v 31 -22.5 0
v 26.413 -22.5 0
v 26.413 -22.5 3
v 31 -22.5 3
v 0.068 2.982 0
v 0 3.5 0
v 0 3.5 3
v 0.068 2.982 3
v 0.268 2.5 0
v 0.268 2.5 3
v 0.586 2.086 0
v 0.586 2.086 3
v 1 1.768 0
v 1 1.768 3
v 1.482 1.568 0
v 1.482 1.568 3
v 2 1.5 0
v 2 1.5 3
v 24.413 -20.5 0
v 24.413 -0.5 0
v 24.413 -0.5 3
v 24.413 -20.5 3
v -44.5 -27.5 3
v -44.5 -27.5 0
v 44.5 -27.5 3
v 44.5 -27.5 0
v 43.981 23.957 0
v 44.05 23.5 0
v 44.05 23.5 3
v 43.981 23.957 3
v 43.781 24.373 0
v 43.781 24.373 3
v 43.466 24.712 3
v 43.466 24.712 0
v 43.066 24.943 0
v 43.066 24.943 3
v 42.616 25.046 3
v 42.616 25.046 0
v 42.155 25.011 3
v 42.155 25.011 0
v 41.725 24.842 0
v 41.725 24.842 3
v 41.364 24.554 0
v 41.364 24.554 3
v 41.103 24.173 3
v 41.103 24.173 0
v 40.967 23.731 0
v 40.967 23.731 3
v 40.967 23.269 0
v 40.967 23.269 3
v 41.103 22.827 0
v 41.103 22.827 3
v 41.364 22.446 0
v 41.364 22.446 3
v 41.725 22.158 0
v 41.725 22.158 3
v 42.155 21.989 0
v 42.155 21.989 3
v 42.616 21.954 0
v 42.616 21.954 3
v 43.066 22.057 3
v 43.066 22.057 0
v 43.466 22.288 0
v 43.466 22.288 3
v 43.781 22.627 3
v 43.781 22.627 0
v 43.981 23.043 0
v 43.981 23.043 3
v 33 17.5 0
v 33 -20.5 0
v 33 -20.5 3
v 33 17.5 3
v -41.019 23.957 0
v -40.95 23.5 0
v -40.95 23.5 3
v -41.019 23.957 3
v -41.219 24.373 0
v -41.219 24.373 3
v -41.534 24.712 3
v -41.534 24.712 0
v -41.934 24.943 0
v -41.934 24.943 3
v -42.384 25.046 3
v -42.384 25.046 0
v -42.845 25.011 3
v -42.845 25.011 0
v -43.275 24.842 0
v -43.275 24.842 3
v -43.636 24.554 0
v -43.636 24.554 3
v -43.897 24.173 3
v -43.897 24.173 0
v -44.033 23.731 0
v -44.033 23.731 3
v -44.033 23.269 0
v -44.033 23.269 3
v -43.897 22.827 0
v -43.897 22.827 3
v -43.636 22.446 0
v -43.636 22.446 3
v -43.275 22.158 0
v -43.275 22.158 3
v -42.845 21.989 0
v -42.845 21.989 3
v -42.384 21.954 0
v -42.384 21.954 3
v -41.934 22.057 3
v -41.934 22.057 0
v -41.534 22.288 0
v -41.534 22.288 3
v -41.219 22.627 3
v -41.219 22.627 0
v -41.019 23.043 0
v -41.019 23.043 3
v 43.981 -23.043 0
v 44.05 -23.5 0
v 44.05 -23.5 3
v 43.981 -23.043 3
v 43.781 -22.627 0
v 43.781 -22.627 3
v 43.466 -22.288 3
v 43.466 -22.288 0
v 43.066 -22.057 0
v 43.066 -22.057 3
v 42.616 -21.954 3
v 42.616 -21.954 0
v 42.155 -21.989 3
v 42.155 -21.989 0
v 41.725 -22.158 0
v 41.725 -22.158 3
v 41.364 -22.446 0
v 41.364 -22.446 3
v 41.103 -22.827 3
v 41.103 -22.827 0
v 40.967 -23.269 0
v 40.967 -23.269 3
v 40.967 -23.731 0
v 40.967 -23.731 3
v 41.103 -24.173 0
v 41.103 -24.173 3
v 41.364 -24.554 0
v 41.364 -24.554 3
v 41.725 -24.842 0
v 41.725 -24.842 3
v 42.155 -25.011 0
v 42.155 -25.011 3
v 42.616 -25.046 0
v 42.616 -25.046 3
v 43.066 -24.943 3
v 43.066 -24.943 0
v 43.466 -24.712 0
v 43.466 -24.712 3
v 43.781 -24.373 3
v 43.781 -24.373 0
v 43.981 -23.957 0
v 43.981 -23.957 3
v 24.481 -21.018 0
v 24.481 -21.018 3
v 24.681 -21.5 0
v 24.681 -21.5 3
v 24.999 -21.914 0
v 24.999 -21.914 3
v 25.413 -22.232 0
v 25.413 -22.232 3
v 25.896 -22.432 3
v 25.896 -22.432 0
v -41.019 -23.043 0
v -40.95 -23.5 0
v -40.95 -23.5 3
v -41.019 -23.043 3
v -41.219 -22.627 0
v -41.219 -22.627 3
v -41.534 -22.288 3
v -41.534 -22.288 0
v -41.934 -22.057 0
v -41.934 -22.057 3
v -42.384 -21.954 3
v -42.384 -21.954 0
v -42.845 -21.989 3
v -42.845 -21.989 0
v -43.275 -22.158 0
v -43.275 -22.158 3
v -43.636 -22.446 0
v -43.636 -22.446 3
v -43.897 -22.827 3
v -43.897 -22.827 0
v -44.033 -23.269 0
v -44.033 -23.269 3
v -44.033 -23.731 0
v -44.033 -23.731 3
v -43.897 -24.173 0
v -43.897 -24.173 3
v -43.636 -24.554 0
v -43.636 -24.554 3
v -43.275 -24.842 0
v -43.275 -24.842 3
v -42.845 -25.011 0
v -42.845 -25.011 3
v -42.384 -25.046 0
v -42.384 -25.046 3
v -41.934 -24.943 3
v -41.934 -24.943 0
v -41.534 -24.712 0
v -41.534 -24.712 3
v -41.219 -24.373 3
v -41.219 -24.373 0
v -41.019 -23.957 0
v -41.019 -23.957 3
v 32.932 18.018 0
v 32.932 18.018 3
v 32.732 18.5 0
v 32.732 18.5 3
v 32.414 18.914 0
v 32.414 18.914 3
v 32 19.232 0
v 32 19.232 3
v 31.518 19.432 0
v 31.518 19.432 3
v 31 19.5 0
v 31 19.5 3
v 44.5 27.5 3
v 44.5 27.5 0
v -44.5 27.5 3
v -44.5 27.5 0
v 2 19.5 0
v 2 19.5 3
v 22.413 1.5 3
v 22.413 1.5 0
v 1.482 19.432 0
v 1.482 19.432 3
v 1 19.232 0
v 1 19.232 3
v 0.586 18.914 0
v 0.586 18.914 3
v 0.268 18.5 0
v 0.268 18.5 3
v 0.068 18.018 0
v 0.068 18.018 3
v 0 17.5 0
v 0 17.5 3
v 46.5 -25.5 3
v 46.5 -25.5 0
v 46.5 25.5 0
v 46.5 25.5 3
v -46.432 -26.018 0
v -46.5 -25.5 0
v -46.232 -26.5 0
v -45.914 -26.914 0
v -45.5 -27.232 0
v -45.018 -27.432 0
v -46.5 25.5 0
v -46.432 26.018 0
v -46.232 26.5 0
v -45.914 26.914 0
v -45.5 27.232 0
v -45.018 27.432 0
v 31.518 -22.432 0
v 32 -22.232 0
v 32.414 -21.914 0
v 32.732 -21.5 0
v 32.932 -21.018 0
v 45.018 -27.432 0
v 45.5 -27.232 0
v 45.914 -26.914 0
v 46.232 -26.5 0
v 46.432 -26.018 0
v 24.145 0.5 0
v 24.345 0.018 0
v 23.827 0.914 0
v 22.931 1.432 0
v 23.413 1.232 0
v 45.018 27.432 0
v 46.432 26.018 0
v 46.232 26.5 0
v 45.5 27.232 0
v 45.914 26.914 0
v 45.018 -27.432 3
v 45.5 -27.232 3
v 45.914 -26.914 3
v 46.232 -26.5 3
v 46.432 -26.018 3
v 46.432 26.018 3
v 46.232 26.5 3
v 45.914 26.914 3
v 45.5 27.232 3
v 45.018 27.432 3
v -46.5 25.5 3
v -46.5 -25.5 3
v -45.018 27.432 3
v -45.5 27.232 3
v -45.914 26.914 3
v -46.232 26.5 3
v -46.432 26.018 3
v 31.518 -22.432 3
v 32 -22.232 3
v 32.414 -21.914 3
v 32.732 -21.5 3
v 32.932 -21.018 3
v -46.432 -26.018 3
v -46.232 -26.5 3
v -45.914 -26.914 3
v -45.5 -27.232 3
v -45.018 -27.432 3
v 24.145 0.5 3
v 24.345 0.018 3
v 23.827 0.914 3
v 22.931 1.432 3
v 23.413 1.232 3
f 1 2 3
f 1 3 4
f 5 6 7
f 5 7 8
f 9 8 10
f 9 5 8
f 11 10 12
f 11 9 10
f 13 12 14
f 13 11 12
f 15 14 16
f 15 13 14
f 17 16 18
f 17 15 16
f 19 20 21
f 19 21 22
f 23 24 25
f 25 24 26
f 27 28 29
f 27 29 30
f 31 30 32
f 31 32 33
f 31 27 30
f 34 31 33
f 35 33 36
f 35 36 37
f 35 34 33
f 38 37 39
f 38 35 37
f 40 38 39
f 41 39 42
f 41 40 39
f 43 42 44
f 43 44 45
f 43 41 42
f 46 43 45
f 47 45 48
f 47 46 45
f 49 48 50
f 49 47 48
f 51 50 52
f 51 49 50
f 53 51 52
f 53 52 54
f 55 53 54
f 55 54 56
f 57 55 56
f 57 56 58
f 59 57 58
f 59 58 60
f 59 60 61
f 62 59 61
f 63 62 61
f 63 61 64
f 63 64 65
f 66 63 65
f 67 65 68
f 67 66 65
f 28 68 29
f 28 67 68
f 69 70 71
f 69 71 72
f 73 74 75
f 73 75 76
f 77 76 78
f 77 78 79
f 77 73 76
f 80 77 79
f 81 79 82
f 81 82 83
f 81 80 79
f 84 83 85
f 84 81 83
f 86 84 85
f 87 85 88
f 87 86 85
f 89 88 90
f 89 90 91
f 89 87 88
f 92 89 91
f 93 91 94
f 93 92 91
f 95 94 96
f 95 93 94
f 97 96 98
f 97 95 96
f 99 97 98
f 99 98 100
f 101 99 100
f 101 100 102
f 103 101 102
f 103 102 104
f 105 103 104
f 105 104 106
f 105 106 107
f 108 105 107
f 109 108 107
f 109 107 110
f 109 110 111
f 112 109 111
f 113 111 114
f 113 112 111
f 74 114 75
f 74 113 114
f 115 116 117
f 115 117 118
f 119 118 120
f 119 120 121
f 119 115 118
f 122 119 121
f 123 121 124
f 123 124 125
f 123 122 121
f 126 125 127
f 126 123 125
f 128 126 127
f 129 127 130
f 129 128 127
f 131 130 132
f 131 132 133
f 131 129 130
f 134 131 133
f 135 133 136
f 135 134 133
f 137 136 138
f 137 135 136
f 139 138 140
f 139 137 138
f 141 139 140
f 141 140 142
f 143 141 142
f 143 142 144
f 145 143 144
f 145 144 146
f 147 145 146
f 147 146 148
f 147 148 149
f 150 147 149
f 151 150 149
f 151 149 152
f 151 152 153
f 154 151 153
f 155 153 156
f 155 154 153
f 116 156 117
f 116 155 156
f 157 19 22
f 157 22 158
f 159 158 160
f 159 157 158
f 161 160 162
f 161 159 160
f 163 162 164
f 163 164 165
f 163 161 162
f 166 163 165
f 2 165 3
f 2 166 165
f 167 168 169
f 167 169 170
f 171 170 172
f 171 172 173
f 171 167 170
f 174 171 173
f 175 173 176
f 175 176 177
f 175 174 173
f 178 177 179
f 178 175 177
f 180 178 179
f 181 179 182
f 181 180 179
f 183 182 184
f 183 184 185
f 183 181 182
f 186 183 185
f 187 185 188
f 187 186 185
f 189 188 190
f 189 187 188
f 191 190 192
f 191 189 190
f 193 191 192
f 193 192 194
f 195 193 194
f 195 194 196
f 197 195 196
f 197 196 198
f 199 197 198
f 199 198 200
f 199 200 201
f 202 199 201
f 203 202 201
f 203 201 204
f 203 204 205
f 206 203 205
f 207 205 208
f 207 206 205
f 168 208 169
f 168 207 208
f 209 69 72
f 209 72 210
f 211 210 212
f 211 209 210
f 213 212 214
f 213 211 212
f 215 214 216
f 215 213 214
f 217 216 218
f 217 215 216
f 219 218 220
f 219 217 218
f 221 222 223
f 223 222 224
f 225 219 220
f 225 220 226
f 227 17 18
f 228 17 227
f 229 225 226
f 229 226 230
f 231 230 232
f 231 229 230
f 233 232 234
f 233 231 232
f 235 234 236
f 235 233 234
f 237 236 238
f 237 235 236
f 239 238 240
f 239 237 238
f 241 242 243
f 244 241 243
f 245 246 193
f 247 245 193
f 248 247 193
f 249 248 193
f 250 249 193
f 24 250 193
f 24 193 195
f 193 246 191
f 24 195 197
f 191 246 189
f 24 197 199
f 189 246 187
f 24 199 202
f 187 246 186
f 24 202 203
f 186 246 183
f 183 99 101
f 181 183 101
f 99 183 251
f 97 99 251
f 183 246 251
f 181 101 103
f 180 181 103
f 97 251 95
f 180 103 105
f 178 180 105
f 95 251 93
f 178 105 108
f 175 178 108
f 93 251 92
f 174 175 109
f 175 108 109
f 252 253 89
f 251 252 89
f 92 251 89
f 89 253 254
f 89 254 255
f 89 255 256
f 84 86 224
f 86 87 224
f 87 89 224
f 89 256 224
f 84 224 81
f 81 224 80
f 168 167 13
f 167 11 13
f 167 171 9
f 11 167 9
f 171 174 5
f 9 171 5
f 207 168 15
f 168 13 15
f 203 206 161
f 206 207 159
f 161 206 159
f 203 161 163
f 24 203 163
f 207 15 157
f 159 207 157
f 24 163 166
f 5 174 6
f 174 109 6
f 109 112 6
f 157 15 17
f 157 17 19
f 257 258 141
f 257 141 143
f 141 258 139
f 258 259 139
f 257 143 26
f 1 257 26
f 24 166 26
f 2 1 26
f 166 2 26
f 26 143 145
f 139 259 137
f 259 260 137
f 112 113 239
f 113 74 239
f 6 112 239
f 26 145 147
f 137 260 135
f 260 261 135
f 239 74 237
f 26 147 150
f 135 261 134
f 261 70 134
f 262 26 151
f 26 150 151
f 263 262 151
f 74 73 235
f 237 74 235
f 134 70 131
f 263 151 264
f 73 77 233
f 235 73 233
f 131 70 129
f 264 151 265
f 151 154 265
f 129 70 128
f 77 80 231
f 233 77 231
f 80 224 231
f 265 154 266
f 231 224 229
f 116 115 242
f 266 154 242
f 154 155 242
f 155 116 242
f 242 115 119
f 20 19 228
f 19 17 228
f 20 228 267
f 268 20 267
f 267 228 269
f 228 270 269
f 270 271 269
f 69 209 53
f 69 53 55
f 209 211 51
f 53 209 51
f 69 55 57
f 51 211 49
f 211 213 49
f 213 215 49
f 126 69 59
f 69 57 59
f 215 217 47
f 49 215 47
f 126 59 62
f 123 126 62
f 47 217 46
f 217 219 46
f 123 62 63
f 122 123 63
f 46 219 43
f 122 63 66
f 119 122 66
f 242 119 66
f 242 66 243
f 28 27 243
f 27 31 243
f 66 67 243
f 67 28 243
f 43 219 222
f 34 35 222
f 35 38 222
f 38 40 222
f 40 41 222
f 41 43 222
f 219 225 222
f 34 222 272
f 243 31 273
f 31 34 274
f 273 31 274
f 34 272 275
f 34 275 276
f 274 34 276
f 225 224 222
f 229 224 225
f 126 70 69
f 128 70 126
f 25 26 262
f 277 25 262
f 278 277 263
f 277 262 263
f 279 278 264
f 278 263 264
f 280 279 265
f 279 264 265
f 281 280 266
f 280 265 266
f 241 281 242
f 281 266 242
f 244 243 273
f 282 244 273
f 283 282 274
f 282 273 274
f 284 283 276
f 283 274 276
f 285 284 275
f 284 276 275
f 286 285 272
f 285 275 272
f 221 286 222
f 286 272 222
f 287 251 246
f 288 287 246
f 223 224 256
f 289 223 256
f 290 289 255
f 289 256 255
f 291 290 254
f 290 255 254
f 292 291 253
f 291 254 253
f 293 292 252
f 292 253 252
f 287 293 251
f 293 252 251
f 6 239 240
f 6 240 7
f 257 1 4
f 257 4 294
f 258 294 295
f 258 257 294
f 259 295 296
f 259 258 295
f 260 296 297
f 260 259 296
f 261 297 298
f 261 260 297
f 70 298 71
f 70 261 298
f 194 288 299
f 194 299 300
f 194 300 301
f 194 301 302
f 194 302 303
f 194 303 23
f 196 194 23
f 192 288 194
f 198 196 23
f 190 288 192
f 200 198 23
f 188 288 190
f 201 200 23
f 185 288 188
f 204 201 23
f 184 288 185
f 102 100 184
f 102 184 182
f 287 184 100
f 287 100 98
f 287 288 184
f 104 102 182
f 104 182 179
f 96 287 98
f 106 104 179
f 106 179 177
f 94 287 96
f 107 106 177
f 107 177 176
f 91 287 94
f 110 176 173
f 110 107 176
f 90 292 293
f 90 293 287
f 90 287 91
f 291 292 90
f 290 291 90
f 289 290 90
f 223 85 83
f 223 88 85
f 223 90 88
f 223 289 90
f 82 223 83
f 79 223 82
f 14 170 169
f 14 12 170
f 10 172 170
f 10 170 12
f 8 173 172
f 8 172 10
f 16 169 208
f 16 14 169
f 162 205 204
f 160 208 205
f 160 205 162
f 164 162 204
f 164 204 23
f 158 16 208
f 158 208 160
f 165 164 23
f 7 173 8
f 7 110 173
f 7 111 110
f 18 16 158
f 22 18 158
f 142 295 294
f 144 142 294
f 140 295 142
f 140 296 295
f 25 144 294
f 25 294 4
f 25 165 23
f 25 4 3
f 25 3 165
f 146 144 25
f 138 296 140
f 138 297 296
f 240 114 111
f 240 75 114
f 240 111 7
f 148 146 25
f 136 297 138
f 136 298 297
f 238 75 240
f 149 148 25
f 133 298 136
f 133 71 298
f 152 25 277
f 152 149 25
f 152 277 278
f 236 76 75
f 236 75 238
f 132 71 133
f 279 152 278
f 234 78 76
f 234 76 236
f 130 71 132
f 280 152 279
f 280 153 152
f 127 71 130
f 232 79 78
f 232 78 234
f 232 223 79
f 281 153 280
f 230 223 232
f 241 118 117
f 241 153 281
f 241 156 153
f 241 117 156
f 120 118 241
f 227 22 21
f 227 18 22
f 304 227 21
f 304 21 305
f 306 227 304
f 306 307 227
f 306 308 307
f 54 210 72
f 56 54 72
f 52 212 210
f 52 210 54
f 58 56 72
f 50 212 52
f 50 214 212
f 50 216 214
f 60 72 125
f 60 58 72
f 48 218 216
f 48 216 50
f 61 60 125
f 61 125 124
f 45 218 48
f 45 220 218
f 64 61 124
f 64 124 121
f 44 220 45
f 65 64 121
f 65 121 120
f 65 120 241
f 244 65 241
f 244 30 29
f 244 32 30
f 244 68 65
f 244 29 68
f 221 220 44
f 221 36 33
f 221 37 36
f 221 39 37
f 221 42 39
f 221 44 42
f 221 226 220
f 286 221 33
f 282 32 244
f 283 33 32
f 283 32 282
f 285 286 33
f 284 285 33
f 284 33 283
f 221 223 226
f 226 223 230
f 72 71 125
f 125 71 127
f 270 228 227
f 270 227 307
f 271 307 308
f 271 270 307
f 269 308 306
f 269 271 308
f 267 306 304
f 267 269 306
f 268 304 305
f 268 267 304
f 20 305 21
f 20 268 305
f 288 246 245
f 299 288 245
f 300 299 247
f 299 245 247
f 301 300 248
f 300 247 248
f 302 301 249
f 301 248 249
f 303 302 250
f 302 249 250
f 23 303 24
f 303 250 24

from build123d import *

# Parameters (mm, degrees)
ESQUISSE1_R        = 1.55
BOSS_EXTRU_1_DEPTH = 3


with BuildPart() as part:
    # Esquisse1 → Boss.-Extru.1 (new body)
    with BuildSketch(Plane.XY):
        with BuildLine():
            Line((-46.5, 25.5), (-46.5, -25.5))
            ThreePointArc((-46.5, -25.5), (-45.914213562, -26.914213562), (-44.5, -27.5))
            Line((-44.5, -27.5), (44.5, -27.5))
            ThreePointArc((44.5, -27.5), (45.914213562, -26.914213562), (46.5, -25.5))
            Line((46.5, -25.5), (46.5, 25.5))
            ThreePointArc((46.5, 25.5), (45.914213562, 26.914213562), (44.5, 27.5))
            Line((44.5, 27.5), (-44.5, 27.5))
            ThreePointArc((-44.5, 27.5), (-45.914213562, 26.914213562), (-46.5, 25.5))
        make_face()
        with Locations((-42.5, 23.5)):
            Circle(ESQUISSE1_R, mode=Mode.SUBTRACT)
        with Locations((-42.5, -23.5)):
            Circle(ESQUISSE1_R, mode=Mode.SUBTRACT)
        with Locations((42.5, 23.5)):
            Circle(ESQUISSE1_R, mode=Mode.SUBTRACT)
        with Locations((42.5, -23.5)):
            Circle(ESQUISSE1_R, mode=Mode.SUBTRACT)
        with BuildLine():
            Line((31, 19.5), (2, 19.5))
            ThreePointArc((2, 19.5), (0.585786438, 18.914213562), (0, 17.5))
            Line((0, 17.5), (0, 3.5))
            ThreePointArc((0, 3.5), (0.585786438, 2.085786438), (2, 1.5))
            Line((2, 1.5), (22.413214262, 1.5))
            ThreePointArc((22.413214262, 1.5), (23.827427824, 0.914213562), (24.413214262, -0.5))
            Line((24.413214262, -0.5), (24.413214262, -20.5))
            ThreePointArc((24.413214262, -20.5), (24.999000699, -21.914213562), (26.413214262, -22.5))
            Line((26.413214262, -22.5), (31, -22.5))
            ThreePointArc((31, -22.5), (32.414213562, -21.914213562), (33, -20.5))
            Line((33, -20.5), (33, 17.5))
            ThreePointArc((33, 17.5), (32.414213562, 18.914213562), (31, 19.5))
        make_face(mode=Mode.SUBTRACT)
    extrude(amount=BOSS_EXTRU_1_DEPTH)


solid = part.part
